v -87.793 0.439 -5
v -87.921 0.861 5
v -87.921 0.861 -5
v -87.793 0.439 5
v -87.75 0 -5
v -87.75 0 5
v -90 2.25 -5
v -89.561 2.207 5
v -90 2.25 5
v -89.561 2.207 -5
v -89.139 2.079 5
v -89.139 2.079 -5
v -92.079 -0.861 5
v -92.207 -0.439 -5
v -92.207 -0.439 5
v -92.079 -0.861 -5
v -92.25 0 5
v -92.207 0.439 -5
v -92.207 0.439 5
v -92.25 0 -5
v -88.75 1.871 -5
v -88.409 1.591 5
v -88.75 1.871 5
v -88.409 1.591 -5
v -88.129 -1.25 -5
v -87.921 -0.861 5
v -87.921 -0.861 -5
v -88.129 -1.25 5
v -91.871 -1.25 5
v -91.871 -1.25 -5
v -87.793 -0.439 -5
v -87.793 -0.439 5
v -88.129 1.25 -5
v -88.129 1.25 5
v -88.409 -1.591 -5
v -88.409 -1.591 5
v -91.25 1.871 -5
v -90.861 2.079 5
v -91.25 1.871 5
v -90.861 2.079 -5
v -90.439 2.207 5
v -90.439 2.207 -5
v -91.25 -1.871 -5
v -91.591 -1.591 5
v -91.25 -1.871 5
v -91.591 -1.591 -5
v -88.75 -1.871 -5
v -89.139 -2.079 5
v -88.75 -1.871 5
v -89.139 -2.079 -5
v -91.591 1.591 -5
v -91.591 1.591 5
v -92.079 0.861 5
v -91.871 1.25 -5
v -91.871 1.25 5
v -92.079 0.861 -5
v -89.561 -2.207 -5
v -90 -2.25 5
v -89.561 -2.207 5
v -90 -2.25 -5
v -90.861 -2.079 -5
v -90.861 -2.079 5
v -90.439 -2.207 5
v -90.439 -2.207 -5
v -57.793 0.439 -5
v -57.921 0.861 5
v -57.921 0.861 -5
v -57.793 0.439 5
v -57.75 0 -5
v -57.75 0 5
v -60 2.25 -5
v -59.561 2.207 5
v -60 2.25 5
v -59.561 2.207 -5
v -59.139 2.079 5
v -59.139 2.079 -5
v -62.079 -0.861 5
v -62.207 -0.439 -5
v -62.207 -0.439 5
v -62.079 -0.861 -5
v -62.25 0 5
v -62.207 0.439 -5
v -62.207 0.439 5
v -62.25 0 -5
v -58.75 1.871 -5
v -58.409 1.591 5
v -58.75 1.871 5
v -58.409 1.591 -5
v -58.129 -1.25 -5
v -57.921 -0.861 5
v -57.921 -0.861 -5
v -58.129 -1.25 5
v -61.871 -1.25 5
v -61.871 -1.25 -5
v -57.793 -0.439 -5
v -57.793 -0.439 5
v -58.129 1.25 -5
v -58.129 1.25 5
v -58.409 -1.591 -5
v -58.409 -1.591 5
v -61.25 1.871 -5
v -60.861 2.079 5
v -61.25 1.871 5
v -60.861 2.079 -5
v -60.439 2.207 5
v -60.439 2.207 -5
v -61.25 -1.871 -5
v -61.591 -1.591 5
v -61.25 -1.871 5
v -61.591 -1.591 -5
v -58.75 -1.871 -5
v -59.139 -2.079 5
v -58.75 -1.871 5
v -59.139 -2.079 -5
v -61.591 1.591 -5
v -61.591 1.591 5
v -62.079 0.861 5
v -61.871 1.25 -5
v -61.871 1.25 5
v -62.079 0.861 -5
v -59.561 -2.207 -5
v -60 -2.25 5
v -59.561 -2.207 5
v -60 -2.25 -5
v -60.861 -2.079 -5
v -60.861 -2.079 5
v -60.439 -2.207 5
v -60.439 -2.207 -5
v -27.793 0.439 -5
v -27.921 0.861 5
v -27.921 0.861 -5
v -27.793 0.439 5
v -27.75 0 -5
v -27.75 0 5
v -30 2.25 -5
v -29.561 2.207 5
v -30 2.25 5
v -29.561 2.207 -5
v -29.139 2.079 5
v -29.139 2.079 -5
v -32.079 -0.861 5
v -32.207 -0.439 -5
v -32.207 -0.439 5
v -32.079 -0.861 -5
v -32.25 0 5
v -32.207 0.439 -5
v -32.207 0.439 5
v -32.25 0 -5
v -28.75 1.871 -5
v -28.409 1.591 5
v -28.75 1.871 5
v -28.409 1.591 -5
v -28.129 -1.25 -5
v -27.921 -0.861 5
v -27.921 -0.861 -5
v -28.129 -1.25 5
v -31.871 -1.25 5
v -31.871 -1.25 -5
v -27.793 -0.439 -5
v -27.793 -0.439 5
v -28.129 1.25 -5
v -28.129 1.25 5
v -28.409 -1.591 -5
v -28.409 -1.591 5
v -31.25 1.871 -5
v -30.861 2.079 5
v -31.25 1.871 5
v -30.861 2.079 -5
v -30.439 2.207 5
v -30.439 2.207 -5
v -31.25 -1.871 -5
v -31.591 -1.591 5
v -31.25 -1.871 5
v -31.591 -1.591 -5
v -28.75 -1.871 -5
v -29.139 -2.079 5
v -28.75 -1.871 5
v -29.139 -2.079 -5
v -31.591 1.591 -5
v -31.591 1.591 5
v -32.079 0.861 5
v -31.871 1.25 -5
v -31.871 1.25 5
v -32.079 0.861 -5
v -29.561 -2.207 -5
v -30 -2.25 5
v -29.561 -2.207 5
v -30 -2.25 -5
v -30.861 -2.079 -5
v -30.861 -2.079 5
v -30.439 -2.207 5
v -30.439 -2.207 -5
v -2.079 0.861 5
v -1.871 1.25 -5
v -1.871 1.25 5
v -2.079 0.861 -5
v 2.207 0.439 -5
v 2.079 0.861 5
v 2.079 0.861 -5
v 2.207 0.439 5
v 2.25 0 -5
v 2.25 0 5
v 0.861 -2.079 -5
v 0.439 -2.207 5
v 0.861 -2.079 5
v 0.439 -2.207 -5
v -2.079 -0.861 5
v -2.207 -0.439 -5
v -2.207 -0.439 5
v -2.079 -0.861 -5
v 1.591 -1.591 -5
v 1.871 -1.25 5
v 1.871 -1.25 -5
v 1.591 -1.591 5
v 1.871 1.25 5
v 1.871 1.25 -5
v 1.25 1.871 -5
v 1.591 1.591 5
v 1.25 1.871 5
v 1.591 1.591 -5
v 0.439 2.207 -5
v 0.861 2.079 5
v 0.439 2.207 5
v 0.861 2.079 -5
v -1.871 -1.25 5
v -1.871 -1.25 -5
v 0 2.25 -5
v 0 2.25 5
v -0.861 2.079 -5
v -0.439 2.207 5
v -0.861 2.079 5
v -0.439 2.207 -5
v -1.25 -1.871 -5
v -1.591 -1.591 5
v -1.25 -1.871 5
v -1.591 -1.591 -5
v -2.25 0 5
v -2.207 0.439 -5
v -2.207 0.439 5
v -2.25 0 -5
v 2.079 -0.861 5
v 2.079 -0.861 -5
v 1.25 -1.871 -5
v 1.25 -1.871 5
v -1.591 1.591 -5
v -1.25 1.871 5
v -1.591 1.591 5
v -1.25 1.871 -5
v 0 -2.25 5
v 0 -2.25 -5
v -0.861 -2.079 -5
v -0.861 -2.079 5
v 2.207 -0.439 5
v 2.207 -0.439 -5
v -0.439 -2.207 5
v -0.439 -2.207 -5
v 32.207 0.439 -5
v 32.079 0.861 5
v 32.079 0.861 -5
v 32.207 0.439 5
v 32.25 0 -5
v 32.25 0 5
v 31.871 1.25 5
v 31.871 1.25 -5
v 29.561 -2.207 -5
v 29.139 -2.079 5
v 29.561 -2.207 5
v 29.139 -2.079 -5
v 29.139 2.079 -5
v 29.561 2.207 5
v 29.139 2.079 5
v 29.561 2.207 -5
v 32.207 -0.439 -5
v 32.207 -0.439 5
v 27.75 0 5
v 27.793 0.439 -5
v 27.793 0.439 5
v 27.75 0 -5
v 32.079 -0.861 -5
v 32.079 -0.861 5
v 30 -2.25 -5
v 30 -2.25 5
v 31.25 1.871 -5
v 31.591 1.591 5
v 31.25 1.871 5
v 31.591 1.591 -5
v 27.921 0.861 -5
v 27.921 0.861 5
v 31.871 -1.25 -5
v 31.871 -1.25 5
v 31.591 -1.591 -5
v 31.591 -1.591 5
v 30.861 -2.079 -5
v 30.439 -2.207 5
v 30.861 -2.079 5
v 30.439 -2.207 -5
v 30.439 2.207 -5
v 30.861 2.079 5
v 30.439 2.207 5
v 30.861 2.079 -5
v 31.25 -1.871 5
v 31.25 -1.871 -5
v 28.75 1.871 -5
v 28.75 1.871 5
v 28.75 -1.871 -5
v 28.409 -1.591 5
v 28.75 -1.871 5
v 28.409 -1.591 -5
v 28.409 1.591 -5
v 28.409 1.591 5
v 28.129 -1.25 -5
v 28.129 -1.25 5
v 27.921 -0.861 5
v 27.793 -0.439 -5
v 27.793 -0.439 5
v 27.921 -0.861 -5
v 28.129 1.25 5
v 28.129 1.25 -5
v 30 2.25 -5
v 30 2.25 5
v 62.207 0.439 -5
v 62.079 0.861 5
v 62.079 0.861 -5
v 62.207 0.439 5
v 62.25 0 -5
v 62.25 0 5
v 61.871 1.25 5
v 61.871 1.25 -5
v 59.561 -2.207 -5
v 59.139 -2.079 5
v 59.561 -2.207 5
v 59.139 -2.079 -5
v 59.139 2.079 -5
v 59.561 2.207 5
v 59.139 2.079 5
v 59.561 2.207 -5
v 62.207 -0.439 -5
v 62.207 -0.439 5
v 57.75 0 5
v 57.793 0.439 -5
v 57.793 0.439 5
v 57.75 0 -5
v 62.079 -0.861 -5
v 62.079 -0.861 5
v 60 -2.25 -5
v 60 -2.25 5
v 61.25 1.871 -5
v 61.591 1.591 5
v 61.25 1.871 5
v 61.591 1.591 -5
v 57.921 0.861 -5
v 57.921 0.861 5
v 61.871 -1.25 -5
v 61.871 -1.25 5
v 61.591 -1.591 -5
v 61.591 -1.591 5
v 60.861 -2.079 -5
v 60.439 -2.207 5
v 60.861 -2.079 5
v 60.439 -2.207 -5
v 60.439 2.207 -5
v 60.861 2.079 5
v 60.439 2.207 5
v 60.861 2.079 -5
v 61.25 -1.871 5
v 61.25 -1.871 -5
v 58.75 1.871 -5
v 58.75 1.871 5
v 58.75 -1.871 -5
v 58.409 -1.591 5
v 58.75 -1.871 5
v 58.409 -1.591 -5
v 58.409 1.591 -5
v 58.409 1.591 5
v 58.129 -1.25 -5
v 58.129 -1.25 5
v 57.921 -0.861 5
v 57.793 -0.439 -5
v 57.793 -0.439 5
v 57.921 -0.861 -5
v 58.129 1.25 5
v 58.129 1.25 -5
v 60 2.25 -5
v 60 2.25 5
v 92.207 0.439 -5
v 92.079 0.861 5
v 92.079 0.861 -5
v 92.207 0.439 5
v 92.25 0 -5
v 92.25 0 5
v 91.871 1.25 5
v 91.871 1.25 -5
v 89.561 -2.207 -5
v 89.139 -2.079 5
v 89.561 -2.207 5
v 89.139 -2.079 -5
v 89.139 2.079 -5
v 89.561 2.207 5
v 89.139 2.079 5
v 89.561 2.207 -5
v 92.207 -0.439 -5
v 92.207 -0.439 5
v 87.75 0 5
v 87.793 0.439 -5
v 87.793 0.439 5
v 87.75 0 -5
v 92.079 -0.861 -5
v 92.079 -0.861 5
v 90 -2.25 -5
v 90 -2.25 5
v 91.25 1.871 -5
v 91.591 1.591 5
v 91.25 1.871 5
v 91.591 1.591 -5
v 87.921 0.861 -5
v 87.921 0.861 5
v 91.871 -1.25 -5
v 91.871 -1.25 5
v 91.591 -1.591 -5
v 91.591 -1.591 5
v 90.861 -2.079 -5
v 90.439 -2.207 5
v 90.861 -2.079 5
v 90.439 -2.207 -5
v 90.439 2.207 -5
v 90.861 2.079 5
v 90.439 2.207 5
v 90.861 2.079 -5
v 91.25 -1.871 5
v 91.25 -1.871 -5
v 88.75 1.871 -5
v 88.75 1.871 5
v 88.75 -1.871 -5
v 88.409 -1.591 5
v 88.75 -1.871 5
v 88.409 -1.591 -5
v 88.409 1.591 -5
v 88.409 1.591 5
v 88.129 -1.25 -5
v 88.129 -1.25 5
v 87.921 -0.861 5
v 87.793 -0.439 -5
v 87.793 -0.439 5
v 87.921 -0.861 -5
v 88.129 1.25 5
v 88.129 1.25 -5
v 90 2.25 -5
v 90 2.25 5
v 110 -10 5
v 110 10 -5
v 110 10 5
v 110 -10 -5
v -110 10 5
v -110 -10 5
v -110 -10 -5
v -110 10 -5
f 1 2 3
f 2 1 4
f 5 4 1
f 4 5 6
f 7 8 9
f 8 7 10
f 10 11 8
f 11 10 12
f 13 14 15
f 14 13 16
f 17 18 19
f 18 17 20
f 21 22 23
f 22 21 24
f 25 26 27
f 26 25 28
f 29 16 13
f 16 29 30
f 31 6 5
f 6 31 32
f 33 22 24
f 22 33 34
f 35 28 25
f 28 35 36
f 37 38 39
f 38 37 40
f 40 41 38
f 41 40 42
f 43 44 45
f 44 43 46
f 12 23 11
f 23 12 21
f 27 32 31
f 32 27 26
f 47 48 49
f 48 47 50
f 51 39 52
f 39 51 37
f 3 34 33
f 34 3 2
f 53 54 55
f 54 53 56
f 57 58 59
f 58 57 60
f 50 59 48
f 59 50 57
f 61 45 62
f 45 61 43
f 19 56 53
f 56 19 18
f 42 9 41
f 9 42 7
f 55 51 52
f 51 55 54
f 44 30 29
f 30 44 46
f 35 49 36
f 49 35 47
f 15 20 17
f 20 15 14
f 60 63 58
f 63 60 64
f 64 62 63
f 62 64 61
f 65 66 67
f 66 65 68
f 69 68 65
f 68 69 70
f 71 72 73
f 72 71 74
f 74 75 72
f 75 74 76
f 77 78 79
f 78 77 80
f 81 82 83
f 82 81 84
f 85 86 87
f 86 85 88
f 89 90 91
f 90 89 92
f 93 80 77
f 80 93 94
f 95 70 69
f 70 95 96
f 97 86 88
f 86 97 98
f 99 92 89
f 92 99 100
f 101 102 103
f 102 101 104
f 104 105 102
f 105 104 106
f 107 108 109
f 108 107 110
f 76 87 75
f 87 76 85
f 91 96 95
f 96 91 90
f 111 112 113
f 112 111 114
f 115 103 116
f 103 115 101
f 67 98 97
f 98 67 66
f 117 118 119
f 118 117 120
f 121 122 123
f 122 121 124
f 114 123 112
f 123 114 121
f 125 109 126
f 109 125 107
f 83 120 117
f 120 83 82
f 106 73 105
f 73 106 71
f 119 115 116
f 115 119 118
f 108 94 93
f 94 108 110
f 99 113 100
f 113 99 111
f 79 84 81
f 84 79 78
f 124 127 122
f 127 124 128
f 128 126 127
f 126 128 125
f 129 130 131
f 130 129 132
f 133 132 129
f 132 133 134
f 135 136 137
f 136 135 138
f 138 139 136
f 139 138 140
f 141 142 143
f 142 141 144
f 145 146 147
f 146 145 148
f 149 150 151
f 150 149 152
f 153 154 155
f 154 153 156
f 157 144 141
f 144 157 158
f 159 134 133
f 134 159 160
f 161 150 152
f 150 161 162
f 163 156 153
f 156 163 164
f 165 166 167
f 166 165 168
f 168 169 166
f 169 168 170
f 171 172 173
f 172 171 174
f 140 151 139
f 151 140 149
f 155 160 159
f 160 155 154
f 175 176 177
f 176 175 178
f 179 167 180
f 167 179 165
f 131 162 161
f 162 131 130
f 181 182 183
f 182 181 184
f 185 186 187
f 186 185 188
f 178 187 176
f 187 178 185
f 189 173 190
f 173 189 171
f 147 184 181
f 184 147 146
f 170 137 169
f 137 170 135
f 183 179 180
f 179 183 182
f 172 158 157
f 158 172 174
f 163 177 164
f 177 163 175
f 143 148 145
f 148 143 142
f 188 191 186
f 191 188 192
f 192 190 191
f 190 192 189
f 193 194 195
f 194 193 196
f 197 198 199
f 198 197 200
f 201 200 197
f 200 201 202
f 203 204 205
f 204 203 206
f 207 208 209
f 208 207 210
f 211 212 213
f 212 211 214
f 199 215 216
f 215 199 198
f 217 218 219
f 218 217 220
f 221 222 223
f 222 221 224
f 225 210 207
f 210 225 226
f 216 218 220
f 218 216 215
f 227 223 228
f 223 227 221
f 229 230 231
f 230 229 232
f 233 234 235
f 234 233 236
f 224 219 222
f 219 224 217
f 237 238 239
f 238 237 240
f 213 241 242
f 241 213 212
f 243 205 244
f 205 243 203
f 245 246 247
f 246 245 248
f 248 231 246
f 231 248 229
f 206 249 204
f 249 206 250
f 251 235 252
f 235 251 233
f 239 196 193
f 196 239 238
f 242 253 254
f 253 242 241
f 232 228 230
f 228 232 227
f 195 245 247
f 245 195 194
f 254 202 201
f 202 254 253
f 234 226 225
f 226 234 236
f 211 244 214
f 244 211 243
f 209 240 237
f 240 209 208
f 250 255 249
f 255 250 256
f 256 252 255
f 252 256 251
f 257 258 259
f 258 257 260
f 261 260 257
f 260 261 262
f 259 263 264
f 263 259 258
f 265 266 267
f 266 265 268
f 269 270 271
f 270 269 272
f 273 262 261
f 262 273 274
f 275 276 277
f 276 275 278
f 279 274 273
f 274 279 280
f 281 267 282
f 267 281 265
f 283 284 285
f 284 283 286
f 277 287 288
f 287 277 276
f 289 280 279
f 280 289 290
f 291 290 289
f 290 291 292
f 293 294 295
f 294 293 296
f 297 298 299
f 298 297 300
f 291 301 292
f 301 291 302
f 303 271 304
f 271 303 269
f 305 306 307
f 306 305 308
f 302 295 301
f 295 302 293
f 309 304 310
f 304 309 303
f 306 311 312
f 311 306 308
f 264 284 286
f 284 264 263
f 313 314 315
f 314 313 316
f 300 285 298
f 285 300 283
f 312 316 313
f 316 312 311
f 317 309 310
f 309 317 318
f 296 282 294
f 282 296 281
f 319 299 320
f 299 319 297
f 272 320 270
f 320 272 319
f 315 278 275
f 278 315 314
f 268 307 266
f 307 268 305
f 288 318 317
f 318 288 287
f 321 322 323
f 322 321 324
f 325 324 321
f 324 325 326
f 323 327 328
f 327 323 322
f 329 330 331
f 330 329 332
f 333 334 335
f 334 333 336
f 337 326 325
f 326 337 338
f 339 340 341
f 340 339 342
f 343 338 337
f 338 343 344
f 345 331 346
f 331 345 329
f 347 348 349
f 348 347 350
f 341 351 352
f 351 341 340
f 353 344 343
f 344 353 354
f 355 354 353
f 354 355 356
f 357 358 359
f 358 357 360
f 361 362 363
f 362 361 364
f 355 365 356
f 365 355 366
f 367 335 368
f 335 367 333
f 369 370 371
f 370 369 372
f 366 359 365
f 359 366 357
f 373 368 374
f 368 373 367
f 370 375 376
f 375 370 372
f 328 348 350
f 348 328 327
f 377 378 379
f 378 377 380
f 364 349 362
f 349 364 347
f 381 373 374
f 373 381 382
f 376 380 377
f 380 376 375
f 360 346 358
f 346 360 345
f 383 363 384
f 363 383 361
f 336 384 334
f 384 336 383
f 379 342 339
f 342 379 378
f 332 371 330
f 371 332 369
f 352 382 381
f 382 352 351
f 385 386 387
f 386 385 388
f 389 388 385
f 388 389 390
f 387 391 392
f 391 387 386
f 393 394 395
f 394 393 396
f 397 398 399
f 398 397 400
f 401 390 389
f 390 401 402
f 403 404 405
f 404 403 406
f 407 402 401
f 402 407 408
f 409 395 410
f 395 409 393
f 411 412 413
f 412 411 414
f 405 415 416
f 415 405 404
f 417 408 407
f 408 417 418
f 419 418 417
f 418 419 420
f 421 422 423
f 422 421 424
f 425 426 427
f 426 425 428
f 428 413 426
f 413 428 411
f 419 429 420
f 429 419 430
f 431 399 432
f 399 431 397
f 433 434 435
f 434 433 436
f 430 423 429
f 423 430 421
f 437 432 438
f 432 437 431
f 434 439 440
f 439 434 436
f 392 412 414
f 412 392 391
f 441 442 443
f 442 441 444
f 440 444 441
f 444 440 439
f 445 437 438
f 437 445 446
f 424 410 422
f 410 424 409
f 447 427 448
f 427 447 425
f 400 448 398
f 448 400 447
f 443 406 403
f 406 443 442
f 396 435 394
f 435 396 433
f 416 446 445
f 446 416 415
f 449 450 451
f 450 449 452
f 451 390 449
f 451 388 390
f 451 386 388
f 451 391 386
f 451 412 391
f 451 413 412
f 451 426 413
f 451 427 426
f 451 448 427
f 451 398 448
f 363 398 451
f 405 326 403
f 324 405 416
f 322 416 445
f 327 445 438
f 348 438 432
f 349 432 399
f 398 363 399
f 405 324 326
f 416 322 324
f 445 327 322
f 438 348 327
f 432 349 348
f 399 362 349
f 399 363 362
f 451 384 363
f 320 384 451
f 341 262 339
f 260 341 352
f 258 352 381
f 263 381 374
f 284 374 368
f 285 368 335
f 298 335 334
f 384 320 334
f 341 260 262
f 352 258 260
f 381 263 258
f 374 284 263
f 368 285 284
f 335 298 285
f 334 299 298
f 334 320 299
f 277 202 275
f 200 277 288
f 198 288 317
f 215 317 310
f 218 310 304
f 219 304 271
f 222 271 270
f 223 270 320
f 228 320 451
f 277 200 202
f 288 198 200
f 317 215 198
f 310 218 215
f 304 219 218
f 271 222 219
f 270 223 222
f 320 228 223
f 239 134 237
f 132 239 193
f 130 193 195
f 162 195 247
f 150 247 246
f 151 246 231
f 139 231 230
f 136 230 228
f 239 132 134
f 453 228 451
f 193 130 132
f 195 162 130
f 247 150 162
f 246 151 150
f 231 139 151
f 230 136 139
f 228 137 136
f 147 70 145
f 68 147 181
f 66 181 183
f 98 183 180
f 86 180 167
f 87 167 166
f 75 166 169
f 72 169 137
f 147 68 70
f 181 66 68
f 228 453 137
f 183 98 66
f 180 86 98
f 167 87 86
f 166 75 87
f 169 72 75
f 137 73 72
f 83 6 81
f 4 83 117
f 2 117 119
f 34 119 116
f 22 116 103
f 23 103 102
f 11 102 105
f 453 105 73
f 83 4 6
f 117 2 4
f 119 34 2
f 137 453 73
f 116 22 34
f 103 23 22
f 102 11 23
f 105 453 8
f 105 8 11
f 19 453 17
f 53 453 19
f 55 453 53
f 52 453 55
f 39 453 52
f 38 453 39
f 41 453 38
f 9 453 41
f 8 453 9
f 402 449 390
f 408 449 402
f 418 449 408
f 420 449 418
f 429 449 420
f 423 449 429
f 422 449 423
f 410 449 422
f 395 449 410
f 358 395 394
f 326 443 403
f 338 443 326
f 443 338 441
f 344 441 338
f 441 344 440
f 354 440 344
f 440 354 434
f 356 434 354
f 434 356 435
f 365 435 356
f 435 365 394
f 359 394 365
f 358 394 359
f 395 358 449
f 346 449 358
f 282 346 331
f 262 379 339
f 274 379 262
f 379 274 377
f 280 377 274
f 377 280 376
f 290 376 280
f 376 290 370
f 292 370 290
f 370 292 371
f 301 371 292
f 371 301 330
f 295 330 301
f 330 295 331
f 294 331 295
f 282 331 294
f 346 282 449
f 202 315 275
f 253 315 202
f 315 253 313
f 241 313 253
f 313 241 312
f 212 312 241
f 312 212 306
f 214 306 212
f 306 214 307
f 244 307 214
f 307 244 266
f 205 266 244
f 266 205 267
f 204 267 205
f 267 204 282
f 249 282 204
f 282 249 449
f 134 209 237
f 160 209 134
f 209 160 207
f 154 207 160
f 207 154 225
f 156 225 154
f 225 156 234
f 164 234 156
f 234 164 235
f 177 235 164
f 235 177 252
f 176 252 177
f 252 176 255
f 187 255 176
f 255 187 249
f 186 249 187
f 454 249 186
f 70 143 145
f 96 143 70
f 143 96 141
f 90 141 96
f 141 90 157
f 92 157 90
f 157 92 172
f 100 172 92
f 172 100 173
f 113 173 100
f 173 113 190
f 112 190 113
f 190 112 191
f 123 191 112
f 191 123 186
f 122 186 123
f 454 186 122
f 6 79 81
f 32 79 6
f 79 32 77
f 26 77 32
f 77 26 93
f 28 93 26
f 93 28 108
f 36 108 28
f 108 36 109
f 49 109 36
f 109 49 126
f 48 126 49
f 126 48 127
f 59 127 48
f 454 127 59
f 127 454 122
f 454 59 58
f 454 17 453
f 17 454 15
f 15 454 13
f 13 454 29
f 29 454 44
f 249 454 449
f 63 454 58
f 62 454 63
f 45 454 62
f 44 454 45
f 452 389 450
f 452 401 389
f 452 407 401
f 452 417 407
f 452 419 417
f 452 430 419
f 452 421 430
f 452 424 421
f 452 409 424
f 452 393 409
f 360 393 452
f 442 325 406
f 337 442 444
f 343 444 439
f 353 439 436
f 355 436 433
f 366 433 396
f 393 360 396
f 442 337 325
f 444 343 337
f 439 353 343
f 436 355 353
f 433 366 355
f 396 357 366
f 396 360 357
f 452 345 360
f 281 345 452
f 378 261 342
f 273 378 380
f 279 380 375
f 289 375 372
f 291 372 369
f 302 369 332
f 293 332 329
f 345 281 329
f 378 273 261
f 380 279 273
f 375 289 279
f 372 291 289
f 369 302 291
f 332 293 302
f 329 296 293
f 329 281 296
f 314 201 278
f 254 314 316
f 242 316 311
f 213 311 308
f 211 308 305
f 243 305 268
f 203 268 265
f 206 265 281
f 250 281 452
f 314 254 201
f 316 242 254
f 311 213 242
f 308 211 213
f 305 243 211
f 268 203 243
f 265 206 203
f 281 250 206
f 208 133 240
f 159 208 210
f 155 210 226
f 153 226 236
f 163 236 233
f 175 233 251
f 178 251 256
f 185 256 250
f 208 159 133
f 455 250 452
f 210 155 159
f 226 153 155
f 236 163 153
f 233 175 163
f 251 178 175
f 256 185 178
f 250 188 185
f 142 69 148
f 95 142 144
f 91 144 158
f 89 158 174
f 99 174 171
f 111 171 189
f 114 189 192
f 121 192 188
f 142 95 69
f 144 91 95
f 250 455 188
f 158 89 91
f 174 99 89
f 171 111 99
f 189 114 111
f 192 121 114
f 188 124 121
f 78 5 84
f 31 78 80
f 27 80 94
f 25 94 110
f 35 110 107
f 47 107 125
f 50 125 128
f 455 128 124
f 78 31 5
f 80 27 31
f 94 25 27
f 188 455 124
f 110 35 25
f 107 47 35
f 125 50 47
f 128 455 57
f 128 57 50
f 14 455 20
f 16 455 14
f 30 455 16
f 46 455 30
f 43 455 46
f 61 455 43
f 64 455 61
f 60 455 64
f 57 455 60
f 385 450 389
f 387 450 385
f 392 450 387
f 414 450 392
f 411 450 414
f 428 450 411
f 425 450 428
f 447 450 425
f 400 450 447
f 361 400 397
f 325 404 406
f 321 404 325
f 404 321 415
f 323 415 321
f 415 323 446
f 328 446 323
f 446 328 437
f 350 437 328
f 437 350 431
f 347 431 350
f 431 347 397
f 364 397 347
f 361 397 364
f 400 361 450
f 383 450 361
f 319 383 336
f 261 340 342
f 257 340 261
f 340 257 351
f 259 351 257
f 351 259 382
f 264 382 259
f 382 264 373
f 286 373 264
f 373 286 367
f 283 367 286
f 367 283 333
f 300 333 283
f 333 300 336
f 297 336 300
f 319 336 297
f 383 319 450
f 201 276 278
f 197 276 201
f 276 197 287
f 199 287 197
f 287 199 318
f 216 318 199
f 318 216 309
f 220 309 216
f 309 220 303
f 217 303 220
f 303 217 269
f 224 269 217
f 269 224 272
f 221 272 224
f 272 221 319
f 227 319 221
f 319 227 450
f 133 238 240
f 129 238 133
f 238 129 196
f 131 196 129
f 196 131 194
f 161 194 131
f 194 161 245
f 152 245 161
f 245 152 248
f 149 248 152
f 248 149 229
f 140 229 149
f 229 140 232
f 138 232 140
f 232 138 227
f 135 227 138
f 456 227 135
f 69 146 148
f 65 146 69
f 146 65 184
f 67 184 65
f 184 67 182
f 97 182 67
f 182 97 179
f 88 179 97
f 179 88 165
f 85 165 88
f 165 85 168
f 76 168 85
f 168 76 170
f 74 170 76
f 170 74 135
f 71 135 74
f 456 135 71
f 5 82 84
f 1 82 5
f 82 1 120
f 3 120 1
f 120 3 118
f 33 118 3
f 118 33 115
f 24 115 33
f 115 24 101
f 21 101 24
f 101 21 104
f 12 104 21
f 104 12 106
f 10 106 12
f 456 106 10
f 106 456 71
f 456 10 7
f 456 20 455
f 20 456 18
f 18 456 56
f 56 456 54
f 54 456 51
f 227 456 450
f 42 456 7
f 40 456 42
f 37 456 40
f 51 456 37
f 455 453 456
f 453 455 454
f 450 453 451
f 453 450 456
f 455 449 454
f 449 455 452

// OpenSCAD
$fn = 32;

// ----------------------------------------------------------------------
// Hole bar, 7 x Ø4.5
// skip layout, 20 mm edge offset
// ----------------------------------------------------------------------

// --- parameters (mm) ---
bar_w = 20;       // bar width (Y)
bar_t = 10;       // bar thickness (Z)
holes = 7;        // holes per row
hole_d = 4.5;     // hole diameter
edge = 20;        // offset from the bar end to the first hole
grid_pitch = 15;  // grid the bar was laid out on

// --- derived feature positions (mm) ---
pitch = grid_pitch * 2;       // = 30   holes sit every other grid slot
span = (holes - 1) * pitch;   // = 180   distance between the end holes
bar_l = span + 2 * edge;      // = 220   overall bar length
start_x = -bar_l / 2 + edge;  // = -90   X of the first hole
feature_centers = [
  [start_x + 0 * pitch, 0],
  [start_x + 1 * pitch, 0],
  [start_x + 2 * pitch, 0],
  [start_x + 3 * pitch, 0],
  [start_x + 4 * pitch, 0],
  [start_x + 5 * pitch, 0],
  [start_x + 6 * pitch, 0]
];   // hole centres of the first row

// bar with one row of holes, drilled from feature_centers
difference() {
  translate([-bar_l / 2, -bar_w / 2, -bar_t / 2]) cube([bar_l, bar_w, bar_t]);
  for (centre = feature_centers)
    translate([centre[0], centre[1], 0])
      cylinder(d = hole_d, h = bar_t + 2, center = true);
}
